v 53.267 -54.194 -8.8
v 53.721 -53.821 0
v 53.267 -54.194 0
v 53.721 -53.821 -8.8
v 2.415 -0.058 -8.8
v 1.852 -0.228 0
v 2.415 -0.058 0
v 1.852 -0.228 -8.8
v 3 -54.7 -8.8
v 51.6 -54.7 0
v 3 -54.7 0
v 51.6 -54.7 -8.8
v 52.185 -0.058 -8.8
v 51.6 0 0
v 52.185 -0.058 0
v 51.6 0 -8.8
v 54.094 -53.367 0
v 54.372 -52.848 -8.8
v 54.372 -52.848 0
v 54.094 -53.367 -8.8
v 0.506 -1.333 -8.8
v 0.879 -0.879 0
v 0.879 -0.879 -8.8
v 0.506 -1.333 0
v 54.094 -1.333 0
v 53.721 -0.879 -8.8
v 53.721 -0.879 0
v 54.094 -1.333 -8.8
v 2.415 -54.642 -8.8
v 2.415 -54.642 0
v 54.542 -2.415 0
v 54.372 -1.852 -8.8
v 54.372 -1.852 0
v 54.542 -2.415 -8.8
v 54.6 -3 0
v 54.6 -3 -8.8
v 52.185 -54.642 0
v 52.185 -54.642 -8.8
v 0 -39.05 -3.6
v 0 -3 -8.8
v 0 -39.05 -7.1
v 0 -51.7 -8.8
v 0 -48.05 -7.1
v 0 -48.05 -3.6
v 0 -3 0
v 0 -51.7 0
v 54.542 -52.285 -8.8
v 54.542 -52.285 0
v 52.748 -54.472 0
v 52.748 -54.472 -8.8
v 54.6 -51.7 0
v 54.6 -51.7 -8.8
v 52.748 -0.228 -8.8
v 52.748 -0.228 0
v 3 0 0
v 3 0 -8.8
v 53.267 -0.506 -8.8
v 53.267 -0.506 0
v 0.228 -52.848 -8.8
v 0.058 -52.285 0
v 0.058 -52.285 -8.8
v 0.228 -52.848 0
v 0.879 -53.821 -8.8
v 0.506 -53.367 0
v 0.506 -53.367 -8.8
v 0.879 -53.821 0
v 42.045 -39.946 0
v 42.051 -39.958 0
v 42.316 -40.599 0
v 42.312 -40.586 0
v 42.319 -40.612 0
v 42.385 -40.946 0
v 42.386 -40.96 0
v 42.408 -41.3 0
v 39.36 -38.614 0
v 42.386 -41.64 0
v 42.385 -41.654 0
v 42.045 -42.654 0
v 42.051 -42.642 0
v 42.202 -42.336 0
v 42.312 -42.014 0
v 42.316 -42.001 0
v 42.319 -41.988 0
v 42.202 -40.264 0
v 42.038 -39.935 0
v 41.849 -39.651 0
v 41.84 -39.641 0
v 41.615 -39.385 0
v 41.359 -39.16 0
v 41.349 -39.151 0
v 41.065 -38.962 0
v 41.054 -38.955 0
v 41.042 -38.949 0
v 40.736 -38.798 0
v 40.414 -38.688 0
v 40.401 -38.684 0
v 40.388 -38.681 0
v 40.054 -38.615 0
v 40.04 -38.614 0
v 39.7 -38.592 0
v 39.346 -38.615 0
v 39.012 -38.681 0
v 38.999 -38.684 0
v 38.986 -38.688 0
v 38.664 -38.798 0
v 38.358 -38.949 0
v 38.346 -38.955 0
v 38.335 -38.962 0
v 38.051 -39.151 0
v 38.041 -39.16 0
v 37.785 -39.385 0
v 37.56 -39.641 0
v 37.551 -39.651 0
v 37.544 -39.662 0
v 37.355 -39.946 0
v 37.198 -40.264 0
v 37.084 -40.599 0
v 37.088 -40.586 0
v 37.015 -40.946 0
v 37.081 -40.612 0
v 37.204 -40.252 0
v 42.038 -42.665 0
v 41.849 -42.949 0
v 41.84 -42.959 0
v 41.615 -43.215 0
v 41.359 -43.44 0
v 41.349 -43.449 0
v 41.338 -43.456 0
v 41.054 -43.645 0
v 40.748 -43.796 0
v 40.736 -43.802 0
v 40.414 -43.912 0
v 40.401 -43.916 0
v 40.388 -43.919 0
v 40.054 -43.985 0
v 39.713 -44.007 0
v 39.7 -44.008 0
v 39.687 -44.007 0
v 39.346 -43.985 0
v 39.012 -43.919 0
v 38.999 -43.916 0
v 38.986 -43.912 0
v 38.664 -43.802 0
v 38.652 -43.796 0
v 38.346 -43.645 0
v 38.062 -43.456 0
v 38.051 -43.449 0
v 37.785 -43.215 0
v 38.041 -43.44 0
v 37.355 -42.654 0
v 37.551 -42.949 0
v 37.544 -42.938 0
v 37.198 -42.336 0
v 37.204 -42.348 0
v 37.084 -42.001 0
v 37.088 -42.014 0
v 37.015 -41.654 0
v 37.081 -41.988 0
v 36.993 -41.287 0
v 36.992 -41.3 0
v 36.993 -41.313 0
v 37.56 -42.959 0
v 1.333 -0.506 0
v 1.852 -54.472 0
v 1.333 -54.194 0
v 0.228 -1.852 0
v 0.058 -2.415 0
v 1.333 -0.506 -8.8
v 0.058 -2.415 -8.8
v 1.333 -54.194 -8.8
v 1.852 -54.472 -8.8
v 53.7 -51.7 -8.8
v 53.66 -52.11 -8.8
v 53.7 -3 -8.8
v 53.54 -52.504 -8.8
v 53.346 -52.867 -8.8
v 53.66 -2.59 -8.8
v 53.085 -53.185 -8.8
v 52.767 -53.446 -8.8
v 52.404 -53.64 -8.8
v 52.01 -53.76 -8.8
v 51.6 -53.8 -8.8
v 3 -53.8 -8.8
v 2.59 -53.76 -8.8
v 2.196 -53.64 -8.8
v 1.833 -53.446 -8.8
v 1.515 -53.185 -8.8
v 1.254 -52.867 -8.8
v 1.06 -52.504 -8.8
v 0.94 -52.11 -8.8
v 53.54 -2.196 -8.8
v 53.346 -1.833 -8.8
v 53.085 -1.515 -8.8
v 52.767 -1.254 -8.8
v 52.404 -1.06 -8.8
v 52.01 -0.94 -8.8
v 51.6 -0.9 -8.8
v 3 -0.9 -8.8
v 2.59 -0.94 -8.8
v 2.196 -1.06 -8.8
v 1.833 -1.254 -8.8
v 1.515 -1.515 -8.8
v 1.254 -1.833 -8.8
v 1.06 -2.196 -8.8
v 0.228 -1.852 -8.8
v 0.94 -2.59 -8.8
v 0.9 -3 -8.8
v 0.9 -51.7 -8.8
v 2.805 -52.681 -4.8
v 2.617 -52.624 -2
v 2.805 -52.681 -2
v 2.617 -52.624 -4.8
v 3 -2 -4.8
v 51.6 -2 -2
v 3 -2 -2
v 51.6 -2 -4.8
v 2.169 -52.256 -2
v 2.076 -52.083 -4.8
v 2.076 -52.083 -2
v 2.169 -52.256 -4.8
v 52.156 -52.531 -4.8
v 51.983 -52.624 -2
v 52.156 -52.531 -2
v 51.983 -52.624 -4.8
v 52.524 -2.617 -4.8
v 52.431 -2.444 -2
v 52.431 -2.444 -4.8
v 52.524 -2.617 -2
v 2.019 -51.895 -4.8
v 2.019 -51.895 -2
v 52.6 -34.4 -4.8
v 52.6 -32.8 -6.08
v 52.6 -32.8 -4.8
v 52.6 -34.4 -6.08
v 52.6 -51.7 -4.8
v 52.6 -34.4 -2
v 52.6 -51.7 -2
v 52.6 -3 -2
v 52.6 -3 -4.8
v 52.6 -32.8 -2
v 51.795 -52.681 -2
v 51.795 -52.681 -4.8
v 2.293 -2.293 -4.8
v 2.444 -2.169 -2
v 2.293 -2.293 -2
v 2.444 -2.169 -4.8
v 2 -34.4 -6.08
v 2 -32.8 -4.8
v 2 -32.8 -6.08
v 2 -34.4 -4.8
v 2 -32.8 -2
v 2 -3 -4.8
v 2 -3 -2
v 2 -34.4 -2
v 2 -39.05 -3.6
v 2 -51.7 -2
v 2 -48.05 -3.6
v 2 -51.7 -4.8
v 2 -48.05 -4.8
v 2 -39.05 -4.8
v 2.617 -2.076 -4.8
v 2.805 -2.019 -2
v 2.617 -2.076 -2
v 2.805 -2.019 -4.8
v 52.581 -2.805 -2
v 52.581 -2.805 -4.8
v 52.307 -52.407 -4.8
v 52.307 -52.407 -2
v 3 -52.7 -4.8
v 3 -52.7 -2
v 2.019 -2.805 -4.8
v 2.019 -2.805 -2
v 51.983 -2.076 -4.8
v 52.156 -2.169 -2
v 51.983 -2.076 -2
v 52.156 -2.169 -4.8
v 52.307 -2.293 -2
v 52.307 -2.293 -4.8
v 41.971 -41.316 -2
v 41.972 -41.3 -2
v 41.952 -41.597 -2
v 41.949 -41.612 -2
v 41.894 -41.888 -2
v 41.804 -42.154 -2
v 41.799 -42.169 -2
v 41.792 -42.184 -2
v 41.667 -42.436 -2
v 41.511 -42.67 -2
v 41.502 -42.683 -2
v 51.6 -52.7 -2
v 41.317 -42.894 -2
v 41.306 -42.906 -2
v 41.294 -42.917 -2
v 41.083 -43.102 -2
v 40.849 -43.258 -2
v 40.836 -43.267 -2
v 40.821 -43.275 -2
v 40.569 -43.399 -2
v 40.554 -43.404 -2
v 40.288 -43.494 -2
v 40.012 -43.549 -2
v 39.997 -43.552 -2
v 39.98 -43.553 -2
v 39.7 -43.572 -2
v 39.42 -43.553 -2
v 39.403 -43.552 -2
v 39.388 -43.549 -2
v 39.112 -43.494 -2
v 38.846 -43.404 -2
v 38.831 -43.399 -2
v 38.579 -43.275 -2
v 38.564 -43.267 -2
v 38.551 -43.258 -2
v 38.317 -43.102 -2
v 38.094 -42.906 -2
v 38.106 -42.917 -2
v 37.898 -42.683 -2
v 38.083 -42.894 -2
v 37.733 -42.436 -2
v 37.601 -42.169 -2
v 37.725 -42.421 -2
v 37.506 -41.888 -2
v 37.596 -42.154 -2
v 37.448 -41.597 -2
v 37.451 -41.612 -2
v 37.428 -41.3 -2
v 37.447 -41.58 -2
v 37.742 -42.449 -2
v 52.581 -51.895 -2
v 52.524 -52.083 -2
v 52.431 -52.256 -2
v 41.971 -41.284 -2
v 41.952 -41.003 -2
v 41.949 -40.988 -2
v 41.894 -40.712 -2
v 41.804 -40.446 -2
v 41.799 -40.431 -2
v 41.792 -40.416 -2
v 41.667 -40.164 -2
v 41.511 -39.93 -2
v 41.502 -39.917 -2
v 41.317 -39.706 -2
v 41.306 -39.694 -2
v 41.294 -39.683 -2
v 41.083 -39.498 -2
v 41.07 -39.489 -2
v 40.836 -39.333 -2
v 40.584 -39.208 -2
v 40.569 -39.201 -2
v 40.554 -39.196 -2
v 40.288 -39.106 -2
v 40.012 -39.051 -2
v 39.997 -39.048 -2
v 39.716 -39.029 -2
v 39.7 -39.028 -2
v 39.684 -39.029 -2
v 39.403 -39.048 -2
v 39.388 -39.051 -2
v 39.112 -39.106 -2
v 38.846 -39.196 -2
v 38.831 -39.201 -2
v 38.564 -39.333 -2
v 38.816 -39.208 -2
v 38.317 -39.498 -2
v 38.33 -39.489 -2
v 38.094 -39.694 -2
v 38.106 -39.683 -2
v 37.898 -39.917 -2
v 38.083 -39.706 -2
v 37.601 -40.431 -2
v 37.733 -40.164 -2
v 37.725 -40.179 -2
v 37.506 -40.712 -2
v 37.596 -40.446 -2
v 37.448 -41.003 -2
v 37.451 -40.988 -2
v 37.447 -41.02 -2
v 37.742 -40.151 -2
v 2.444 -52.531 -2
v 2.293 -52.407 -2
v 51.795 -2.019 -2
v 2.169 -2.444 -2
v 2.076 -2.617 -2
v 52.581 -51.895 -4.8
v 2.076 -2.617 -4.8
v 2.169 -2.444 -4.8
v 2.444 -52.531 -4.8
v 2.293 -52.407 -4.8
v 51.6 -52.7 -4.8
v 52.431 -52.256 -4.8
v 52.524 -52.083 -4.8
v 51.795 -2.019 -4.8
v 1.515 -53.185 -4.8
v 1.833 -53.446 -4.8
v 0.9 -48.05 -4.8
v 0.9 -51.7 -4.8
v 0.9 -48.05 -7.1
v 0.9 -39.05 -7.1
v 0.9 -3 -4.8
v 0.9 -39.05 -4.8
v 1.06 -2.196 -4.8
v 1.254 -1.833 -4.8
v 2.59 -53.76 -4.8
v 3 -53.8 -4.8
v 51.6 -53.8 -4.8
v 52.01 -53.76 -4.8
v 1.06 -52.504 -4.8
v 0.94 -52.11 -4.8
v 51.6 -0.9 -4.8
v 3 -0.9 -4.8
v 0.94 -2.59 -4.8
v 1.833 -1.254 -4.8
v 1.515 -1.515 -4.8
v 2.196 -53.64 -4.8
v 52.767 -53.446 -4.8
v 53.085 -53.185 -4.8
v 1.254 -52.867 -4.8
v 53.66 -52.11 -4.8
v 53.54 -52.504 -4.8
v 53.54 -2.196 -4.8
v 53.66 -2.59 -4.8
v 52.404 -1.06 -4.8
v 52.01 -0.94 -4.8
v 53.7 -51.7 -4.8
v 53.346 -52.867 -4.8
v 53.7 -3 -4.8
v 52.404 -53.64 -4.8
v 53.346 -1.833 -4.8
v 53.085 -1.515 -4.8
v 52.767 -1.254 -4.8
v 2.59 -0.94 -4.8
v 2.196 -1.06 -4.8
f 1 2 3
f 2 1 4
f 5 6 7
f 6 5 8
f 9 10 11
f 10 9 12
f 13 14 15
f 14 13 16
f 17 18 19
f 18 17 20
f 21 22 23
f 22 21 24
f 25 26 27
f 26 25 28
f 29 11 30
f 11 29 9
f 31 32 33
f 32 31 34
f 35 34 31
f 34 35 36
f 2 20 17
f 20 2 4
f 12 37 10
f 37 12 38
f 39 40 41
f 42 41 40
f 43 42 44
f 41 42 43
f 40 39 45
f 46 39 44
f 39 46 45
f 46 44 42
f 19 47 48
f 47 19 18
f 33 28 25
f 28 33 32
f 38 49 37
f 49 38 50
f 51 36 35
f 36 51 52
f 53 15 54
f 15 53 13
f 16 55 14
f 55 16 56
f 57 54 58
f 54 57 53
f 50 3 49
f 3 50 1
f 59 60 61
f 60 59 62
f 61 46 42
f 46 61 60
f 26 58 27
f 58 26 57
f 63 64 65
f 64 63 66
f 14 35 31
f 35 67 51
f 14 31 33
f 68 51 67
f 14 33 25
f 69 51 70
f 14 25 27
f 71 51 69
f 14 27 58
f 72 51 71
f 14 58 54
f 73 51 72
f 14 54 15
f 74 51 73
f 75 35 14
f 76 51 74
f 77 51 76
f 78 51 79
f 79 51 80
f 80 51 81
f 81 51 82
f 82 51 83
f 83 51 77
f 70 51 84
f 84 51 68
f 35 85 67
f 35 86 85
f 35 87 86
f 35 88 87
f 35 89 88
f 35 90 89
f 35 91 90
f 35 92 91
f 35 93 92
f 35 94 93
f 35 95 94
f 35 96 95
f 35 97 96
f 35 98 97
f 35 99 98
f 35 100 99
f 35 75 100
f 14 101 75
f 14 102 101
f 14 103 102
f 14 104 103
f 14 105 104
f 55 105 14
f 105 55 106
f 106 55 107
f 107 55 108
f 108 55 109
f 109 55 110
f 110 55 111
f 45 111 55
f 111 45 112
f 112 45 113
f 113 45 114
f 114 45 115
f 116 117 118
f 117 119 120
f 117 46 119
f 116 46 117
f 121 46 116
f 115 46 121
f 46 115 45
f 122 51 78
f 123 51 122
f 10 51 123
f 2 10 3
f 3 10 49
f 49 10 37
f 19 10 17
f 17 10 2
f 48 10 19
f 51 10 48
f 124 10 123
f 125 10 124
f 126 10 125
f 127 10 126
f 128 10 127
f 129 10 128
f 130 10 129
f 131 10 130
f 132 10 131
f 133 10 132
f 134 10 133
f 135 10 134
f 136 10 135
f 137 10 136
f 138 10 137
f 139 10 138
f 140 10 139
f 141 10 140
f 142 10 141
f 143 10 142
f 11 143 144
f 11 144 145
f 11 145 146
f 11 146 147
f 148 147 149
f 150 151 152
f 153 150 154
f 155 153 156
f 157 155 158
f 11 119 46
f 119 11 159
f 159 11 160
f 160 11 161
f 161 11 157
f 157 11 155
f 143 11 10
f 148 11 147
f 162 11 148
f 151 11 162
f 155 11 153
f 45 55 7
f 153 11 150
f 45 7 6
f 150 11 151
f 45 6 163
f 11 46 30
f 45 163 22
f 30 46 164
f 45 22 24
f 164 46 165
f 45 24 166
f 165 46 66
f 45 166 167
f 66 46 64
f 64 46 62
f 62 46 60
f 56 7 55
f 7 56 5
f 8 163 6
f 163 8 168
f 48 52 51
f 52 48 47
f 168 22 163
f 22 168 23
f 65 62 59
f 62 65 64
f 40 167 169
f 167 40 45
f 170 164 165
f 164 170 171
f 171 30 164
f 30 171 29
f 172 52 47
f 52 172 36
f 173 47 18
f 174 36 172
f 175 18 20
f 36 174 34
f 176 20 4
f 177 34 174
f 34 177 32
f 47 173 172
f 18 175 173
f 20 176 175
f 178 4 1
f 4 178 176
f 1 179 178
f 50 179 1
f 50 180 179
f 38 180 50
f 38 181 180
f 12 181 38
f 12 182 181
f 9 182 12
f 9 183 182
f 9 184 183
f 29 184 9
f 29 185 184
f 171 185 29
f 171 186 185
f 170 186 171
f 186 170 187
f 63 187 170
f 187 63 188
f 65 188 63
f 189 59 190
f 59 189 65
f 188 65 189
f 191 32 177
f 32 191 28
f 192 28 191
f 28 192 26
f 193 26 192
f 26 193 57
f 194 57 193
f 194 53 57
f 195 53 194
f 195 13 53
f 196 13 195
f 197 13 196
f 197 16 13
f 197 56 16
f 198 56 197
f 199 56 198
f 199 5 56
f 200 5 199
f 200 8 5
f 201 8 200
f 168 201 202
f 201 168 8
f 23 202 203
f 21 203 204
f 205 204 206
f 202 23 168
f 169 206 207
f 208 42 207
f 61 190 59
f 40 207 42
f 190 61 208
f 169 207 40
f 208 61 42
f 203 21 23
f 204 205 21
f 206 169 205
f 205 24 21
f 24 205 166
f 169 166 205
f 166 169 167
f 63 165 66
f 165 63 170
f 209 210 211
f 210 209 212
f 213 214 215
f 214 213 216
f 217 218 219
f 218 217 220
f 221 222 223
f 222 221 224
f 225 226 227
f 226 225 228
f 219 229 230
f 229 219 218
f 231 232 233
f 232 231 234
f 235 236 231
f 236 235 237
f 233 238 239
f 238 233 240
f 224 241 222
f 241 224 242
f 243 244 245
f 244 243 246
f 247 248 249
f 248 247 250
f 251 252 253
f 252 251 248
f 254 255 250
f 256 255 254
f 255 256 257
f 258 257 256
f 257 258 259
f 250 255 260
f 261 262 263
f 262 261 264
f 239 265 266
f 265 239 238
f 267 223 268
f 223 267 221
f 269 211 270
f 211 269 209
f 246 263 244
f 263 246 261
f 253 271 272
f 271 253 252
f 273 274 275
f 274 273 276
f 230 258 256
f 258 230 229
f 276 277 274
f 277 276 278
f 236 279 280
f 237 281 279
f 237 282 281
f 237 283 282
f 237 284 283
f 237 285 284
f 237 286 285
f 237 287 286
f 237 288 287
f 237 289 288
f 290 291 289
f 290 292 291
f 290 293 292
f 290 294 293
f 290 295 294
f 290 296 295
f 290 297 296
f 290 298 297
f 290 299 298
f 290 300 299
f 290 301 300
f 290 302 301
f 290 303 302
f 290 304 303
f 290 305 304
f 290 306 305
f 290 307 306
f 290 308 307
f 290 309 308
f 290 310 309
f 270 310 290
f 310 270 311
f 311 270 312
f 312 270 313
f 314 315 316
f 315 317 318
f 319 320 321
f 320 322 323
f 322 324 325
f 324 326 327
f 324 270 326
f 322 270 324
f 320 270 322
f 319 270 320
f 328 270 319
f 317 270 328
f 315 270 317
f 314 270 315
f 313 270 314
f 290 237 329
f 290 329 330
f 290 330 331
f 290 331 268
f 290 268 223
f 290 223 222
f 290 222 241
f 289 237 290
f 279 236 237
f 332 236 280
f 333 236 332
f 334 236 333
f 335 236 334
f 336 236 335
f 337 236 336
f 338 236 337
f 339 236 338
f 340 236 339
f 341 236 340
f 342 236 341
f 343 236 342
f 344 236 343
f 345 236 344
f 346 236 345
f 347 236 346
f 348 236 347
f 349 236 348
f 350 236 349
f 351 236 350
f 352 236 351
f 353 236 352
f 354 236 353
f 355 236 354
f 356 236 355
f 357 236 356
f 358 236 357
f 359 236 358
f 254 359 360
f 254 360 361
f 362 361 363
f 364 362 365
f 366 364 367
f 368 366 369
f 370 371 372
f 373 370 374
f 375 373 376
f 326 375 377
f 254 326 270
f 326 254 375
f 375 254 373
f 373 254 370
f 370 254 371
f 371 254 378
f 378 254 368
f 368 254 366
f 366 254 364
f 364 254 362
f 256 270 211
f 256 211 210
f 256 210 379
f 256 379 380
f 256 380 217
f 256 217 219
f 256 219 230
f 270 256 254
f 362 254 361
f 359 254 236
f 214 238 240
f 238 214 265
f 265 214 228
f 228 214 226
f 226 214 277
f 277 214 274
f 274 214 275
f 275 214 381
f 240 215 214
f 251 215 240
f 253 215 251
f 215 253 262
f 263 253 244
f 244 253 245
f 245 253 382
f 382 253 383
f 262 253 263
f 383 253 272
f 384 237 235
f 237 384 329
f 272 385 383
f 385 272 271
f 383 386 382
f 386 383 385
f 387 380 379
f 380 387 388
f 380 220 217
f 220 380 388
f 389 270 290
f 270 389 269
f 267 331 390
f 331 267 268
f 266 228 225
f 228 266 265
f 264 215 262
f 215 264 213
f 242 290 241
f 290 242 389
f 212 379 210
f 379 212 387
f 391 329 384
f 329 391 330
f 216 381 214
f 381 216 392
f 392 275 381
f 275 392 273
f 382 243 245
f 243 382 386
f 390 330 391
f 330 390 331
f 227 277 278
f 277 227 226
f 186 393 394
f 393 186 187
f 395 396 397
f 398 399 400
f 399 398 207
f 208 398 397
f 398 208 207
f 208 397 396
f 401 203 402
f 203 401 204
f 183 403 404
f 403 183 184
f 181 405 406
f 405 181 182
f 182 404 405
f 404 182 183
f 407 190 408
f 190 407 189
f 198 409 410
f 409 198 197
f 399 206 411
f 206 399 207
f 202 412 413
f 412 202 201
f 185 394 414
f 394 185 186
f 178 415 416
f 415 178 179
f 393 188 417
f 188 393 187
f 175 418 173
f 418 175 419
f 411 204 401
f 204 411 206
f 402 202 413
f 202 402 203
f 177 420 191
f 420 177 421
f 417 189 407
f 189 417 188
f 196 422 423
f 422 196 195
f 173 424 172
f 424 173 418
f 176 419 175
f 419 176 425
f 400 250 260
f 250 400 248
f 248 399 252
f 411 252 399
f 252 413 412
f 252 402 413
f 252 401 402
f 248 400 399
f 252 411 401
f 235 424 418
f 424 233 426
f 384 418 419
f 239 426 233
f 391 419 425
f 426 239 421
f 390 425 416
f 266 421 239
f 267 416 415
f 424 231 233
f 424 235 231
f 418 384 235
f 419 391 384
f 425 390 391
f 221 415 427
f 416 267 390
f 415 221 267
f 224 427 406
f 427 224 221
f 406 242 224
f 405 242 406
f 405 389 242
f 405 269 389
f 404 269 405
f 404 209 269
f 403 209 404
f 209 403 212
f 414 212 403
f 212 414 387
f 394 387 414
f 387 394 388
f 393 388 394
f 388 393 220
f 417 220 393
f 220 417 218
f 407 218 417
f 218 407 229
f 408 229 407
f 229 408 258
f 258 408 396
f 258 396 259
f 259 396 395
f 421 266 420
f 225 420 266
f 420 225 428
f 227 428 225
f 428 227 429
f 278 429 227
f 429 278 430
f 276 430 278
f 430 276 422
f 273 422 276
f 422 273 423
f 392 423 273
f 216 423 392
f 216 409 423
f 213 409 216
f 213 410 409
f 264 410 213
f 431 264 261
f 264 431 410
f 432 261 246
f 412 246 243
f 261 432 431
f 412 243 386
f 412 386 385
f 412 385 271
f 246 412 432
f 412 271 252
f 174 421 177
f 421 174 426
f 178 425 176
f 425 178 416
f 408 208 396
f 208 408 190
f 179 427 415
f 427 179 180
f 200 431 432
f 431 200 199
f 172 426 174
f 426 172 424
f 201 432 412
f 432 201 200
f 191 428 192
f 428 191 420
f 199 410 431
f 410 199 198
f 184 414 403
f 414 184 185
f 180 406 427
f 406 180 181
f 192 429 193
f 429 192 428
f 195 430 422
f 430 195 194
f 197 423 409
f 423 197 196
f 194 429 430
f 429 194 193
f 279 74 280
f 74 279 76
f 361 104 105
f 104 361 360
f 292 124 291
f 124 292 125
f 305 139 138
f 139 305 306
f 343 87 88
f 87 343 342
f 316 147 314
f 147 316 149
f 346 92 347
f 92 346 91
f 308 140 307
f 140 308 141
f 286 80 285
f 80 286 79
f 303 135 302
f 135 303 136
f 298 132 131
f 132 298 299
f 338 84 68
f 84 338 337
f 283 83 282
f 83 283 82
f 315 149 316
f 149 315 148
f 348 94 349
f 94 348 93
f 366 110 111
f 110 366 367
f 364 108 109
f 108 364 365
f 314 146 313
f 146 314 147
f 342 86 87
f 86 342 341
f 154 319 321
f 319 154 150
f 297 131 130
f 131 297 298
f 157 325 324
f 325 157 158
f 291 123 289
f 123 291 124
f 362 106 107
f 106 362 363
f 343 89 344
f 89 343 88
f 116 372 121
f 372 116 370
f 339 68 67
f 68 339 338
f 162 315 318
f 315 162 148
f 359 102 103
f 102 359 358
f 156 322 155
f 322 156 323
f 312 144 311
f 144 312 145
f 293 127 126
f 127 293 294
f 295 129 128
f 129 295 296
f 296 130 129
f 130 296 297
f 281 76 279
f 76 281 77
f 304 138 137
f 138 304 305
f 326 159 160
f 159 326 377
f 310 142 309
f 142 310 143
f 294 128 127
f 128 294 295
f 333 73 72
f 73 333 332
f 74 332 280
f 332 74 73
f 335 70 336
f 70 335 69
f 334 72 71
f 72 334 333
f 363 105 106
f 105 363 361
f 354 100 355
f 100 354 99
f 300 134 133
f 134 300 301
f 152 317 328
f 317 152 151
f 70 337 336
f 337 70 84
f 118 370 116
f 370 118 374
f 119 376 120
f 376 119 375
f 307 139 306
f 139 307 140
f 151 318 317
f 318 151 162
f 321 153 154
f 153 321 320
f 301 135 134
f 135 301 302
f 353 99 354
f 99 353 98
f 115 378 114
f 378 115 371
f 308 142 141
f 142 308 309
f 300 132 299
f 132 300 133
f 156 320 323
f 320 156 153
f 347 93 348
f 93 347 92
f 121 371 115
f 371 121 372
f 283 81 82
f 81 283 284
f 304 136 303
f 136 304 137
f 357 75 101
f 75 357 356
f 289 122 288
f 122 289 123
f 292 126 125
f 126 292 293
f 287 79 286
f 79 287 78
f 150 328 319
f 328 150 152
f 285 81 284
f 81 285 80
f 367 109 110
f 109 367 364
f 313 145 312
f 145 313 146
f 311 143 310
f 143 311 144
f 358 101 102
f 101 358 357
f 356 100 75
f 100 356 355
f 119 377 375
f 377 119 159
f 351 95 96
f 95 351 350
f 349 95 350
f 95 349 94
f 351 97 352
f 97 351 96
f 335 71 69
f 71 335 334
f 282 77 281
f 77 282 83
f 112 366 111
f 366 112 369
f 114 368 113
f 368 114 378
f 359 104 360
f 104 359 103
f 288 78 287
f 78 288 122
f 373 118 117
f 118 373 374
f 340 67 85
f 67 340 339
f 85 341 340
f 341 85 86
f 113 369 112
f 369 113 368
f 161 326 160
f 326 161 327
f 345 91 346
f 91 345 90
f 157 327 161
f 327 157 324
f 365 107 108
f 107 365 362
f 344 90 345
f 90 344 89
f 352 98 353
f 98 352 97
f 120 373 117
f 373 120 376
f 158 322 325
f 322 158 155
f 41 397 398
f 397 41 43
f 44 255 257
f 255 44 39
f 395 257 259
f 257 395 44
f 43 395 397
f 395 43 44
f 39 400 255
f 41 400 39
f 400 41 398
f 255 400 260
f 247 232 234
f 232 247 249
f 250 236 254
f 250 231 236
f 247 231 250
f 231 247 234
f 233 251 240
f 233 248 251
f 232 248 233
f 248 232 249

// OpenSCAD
// Il contenitore visto dal fondo: foro ottico svasato e superficie che
// appoggia sul coperchio della tramoggia.
//
// Il pezzo e' capovolto invece di essere guardato dal basso spostando la
// camera. La luce di OpenSCAD e' fissa nel mondo e viene dall'alto: una
// camera sotto il pezzo restituisce una faccia uniformemente scura, dove il
// foro ottico non si distingue. Capovolgere il pezzo e' anche il gesto che
// si fa davvero per guardargli il fondo.
//
// 'use' e non 'include': qui servono solo i moduli, e con include il codice
// in coda a case.scad emetterebbe anche il pezzo diritto, che non si puo'
// piu' ruotare.

use <../case.scad>

rotate([180, 0, 0]) scatola();
